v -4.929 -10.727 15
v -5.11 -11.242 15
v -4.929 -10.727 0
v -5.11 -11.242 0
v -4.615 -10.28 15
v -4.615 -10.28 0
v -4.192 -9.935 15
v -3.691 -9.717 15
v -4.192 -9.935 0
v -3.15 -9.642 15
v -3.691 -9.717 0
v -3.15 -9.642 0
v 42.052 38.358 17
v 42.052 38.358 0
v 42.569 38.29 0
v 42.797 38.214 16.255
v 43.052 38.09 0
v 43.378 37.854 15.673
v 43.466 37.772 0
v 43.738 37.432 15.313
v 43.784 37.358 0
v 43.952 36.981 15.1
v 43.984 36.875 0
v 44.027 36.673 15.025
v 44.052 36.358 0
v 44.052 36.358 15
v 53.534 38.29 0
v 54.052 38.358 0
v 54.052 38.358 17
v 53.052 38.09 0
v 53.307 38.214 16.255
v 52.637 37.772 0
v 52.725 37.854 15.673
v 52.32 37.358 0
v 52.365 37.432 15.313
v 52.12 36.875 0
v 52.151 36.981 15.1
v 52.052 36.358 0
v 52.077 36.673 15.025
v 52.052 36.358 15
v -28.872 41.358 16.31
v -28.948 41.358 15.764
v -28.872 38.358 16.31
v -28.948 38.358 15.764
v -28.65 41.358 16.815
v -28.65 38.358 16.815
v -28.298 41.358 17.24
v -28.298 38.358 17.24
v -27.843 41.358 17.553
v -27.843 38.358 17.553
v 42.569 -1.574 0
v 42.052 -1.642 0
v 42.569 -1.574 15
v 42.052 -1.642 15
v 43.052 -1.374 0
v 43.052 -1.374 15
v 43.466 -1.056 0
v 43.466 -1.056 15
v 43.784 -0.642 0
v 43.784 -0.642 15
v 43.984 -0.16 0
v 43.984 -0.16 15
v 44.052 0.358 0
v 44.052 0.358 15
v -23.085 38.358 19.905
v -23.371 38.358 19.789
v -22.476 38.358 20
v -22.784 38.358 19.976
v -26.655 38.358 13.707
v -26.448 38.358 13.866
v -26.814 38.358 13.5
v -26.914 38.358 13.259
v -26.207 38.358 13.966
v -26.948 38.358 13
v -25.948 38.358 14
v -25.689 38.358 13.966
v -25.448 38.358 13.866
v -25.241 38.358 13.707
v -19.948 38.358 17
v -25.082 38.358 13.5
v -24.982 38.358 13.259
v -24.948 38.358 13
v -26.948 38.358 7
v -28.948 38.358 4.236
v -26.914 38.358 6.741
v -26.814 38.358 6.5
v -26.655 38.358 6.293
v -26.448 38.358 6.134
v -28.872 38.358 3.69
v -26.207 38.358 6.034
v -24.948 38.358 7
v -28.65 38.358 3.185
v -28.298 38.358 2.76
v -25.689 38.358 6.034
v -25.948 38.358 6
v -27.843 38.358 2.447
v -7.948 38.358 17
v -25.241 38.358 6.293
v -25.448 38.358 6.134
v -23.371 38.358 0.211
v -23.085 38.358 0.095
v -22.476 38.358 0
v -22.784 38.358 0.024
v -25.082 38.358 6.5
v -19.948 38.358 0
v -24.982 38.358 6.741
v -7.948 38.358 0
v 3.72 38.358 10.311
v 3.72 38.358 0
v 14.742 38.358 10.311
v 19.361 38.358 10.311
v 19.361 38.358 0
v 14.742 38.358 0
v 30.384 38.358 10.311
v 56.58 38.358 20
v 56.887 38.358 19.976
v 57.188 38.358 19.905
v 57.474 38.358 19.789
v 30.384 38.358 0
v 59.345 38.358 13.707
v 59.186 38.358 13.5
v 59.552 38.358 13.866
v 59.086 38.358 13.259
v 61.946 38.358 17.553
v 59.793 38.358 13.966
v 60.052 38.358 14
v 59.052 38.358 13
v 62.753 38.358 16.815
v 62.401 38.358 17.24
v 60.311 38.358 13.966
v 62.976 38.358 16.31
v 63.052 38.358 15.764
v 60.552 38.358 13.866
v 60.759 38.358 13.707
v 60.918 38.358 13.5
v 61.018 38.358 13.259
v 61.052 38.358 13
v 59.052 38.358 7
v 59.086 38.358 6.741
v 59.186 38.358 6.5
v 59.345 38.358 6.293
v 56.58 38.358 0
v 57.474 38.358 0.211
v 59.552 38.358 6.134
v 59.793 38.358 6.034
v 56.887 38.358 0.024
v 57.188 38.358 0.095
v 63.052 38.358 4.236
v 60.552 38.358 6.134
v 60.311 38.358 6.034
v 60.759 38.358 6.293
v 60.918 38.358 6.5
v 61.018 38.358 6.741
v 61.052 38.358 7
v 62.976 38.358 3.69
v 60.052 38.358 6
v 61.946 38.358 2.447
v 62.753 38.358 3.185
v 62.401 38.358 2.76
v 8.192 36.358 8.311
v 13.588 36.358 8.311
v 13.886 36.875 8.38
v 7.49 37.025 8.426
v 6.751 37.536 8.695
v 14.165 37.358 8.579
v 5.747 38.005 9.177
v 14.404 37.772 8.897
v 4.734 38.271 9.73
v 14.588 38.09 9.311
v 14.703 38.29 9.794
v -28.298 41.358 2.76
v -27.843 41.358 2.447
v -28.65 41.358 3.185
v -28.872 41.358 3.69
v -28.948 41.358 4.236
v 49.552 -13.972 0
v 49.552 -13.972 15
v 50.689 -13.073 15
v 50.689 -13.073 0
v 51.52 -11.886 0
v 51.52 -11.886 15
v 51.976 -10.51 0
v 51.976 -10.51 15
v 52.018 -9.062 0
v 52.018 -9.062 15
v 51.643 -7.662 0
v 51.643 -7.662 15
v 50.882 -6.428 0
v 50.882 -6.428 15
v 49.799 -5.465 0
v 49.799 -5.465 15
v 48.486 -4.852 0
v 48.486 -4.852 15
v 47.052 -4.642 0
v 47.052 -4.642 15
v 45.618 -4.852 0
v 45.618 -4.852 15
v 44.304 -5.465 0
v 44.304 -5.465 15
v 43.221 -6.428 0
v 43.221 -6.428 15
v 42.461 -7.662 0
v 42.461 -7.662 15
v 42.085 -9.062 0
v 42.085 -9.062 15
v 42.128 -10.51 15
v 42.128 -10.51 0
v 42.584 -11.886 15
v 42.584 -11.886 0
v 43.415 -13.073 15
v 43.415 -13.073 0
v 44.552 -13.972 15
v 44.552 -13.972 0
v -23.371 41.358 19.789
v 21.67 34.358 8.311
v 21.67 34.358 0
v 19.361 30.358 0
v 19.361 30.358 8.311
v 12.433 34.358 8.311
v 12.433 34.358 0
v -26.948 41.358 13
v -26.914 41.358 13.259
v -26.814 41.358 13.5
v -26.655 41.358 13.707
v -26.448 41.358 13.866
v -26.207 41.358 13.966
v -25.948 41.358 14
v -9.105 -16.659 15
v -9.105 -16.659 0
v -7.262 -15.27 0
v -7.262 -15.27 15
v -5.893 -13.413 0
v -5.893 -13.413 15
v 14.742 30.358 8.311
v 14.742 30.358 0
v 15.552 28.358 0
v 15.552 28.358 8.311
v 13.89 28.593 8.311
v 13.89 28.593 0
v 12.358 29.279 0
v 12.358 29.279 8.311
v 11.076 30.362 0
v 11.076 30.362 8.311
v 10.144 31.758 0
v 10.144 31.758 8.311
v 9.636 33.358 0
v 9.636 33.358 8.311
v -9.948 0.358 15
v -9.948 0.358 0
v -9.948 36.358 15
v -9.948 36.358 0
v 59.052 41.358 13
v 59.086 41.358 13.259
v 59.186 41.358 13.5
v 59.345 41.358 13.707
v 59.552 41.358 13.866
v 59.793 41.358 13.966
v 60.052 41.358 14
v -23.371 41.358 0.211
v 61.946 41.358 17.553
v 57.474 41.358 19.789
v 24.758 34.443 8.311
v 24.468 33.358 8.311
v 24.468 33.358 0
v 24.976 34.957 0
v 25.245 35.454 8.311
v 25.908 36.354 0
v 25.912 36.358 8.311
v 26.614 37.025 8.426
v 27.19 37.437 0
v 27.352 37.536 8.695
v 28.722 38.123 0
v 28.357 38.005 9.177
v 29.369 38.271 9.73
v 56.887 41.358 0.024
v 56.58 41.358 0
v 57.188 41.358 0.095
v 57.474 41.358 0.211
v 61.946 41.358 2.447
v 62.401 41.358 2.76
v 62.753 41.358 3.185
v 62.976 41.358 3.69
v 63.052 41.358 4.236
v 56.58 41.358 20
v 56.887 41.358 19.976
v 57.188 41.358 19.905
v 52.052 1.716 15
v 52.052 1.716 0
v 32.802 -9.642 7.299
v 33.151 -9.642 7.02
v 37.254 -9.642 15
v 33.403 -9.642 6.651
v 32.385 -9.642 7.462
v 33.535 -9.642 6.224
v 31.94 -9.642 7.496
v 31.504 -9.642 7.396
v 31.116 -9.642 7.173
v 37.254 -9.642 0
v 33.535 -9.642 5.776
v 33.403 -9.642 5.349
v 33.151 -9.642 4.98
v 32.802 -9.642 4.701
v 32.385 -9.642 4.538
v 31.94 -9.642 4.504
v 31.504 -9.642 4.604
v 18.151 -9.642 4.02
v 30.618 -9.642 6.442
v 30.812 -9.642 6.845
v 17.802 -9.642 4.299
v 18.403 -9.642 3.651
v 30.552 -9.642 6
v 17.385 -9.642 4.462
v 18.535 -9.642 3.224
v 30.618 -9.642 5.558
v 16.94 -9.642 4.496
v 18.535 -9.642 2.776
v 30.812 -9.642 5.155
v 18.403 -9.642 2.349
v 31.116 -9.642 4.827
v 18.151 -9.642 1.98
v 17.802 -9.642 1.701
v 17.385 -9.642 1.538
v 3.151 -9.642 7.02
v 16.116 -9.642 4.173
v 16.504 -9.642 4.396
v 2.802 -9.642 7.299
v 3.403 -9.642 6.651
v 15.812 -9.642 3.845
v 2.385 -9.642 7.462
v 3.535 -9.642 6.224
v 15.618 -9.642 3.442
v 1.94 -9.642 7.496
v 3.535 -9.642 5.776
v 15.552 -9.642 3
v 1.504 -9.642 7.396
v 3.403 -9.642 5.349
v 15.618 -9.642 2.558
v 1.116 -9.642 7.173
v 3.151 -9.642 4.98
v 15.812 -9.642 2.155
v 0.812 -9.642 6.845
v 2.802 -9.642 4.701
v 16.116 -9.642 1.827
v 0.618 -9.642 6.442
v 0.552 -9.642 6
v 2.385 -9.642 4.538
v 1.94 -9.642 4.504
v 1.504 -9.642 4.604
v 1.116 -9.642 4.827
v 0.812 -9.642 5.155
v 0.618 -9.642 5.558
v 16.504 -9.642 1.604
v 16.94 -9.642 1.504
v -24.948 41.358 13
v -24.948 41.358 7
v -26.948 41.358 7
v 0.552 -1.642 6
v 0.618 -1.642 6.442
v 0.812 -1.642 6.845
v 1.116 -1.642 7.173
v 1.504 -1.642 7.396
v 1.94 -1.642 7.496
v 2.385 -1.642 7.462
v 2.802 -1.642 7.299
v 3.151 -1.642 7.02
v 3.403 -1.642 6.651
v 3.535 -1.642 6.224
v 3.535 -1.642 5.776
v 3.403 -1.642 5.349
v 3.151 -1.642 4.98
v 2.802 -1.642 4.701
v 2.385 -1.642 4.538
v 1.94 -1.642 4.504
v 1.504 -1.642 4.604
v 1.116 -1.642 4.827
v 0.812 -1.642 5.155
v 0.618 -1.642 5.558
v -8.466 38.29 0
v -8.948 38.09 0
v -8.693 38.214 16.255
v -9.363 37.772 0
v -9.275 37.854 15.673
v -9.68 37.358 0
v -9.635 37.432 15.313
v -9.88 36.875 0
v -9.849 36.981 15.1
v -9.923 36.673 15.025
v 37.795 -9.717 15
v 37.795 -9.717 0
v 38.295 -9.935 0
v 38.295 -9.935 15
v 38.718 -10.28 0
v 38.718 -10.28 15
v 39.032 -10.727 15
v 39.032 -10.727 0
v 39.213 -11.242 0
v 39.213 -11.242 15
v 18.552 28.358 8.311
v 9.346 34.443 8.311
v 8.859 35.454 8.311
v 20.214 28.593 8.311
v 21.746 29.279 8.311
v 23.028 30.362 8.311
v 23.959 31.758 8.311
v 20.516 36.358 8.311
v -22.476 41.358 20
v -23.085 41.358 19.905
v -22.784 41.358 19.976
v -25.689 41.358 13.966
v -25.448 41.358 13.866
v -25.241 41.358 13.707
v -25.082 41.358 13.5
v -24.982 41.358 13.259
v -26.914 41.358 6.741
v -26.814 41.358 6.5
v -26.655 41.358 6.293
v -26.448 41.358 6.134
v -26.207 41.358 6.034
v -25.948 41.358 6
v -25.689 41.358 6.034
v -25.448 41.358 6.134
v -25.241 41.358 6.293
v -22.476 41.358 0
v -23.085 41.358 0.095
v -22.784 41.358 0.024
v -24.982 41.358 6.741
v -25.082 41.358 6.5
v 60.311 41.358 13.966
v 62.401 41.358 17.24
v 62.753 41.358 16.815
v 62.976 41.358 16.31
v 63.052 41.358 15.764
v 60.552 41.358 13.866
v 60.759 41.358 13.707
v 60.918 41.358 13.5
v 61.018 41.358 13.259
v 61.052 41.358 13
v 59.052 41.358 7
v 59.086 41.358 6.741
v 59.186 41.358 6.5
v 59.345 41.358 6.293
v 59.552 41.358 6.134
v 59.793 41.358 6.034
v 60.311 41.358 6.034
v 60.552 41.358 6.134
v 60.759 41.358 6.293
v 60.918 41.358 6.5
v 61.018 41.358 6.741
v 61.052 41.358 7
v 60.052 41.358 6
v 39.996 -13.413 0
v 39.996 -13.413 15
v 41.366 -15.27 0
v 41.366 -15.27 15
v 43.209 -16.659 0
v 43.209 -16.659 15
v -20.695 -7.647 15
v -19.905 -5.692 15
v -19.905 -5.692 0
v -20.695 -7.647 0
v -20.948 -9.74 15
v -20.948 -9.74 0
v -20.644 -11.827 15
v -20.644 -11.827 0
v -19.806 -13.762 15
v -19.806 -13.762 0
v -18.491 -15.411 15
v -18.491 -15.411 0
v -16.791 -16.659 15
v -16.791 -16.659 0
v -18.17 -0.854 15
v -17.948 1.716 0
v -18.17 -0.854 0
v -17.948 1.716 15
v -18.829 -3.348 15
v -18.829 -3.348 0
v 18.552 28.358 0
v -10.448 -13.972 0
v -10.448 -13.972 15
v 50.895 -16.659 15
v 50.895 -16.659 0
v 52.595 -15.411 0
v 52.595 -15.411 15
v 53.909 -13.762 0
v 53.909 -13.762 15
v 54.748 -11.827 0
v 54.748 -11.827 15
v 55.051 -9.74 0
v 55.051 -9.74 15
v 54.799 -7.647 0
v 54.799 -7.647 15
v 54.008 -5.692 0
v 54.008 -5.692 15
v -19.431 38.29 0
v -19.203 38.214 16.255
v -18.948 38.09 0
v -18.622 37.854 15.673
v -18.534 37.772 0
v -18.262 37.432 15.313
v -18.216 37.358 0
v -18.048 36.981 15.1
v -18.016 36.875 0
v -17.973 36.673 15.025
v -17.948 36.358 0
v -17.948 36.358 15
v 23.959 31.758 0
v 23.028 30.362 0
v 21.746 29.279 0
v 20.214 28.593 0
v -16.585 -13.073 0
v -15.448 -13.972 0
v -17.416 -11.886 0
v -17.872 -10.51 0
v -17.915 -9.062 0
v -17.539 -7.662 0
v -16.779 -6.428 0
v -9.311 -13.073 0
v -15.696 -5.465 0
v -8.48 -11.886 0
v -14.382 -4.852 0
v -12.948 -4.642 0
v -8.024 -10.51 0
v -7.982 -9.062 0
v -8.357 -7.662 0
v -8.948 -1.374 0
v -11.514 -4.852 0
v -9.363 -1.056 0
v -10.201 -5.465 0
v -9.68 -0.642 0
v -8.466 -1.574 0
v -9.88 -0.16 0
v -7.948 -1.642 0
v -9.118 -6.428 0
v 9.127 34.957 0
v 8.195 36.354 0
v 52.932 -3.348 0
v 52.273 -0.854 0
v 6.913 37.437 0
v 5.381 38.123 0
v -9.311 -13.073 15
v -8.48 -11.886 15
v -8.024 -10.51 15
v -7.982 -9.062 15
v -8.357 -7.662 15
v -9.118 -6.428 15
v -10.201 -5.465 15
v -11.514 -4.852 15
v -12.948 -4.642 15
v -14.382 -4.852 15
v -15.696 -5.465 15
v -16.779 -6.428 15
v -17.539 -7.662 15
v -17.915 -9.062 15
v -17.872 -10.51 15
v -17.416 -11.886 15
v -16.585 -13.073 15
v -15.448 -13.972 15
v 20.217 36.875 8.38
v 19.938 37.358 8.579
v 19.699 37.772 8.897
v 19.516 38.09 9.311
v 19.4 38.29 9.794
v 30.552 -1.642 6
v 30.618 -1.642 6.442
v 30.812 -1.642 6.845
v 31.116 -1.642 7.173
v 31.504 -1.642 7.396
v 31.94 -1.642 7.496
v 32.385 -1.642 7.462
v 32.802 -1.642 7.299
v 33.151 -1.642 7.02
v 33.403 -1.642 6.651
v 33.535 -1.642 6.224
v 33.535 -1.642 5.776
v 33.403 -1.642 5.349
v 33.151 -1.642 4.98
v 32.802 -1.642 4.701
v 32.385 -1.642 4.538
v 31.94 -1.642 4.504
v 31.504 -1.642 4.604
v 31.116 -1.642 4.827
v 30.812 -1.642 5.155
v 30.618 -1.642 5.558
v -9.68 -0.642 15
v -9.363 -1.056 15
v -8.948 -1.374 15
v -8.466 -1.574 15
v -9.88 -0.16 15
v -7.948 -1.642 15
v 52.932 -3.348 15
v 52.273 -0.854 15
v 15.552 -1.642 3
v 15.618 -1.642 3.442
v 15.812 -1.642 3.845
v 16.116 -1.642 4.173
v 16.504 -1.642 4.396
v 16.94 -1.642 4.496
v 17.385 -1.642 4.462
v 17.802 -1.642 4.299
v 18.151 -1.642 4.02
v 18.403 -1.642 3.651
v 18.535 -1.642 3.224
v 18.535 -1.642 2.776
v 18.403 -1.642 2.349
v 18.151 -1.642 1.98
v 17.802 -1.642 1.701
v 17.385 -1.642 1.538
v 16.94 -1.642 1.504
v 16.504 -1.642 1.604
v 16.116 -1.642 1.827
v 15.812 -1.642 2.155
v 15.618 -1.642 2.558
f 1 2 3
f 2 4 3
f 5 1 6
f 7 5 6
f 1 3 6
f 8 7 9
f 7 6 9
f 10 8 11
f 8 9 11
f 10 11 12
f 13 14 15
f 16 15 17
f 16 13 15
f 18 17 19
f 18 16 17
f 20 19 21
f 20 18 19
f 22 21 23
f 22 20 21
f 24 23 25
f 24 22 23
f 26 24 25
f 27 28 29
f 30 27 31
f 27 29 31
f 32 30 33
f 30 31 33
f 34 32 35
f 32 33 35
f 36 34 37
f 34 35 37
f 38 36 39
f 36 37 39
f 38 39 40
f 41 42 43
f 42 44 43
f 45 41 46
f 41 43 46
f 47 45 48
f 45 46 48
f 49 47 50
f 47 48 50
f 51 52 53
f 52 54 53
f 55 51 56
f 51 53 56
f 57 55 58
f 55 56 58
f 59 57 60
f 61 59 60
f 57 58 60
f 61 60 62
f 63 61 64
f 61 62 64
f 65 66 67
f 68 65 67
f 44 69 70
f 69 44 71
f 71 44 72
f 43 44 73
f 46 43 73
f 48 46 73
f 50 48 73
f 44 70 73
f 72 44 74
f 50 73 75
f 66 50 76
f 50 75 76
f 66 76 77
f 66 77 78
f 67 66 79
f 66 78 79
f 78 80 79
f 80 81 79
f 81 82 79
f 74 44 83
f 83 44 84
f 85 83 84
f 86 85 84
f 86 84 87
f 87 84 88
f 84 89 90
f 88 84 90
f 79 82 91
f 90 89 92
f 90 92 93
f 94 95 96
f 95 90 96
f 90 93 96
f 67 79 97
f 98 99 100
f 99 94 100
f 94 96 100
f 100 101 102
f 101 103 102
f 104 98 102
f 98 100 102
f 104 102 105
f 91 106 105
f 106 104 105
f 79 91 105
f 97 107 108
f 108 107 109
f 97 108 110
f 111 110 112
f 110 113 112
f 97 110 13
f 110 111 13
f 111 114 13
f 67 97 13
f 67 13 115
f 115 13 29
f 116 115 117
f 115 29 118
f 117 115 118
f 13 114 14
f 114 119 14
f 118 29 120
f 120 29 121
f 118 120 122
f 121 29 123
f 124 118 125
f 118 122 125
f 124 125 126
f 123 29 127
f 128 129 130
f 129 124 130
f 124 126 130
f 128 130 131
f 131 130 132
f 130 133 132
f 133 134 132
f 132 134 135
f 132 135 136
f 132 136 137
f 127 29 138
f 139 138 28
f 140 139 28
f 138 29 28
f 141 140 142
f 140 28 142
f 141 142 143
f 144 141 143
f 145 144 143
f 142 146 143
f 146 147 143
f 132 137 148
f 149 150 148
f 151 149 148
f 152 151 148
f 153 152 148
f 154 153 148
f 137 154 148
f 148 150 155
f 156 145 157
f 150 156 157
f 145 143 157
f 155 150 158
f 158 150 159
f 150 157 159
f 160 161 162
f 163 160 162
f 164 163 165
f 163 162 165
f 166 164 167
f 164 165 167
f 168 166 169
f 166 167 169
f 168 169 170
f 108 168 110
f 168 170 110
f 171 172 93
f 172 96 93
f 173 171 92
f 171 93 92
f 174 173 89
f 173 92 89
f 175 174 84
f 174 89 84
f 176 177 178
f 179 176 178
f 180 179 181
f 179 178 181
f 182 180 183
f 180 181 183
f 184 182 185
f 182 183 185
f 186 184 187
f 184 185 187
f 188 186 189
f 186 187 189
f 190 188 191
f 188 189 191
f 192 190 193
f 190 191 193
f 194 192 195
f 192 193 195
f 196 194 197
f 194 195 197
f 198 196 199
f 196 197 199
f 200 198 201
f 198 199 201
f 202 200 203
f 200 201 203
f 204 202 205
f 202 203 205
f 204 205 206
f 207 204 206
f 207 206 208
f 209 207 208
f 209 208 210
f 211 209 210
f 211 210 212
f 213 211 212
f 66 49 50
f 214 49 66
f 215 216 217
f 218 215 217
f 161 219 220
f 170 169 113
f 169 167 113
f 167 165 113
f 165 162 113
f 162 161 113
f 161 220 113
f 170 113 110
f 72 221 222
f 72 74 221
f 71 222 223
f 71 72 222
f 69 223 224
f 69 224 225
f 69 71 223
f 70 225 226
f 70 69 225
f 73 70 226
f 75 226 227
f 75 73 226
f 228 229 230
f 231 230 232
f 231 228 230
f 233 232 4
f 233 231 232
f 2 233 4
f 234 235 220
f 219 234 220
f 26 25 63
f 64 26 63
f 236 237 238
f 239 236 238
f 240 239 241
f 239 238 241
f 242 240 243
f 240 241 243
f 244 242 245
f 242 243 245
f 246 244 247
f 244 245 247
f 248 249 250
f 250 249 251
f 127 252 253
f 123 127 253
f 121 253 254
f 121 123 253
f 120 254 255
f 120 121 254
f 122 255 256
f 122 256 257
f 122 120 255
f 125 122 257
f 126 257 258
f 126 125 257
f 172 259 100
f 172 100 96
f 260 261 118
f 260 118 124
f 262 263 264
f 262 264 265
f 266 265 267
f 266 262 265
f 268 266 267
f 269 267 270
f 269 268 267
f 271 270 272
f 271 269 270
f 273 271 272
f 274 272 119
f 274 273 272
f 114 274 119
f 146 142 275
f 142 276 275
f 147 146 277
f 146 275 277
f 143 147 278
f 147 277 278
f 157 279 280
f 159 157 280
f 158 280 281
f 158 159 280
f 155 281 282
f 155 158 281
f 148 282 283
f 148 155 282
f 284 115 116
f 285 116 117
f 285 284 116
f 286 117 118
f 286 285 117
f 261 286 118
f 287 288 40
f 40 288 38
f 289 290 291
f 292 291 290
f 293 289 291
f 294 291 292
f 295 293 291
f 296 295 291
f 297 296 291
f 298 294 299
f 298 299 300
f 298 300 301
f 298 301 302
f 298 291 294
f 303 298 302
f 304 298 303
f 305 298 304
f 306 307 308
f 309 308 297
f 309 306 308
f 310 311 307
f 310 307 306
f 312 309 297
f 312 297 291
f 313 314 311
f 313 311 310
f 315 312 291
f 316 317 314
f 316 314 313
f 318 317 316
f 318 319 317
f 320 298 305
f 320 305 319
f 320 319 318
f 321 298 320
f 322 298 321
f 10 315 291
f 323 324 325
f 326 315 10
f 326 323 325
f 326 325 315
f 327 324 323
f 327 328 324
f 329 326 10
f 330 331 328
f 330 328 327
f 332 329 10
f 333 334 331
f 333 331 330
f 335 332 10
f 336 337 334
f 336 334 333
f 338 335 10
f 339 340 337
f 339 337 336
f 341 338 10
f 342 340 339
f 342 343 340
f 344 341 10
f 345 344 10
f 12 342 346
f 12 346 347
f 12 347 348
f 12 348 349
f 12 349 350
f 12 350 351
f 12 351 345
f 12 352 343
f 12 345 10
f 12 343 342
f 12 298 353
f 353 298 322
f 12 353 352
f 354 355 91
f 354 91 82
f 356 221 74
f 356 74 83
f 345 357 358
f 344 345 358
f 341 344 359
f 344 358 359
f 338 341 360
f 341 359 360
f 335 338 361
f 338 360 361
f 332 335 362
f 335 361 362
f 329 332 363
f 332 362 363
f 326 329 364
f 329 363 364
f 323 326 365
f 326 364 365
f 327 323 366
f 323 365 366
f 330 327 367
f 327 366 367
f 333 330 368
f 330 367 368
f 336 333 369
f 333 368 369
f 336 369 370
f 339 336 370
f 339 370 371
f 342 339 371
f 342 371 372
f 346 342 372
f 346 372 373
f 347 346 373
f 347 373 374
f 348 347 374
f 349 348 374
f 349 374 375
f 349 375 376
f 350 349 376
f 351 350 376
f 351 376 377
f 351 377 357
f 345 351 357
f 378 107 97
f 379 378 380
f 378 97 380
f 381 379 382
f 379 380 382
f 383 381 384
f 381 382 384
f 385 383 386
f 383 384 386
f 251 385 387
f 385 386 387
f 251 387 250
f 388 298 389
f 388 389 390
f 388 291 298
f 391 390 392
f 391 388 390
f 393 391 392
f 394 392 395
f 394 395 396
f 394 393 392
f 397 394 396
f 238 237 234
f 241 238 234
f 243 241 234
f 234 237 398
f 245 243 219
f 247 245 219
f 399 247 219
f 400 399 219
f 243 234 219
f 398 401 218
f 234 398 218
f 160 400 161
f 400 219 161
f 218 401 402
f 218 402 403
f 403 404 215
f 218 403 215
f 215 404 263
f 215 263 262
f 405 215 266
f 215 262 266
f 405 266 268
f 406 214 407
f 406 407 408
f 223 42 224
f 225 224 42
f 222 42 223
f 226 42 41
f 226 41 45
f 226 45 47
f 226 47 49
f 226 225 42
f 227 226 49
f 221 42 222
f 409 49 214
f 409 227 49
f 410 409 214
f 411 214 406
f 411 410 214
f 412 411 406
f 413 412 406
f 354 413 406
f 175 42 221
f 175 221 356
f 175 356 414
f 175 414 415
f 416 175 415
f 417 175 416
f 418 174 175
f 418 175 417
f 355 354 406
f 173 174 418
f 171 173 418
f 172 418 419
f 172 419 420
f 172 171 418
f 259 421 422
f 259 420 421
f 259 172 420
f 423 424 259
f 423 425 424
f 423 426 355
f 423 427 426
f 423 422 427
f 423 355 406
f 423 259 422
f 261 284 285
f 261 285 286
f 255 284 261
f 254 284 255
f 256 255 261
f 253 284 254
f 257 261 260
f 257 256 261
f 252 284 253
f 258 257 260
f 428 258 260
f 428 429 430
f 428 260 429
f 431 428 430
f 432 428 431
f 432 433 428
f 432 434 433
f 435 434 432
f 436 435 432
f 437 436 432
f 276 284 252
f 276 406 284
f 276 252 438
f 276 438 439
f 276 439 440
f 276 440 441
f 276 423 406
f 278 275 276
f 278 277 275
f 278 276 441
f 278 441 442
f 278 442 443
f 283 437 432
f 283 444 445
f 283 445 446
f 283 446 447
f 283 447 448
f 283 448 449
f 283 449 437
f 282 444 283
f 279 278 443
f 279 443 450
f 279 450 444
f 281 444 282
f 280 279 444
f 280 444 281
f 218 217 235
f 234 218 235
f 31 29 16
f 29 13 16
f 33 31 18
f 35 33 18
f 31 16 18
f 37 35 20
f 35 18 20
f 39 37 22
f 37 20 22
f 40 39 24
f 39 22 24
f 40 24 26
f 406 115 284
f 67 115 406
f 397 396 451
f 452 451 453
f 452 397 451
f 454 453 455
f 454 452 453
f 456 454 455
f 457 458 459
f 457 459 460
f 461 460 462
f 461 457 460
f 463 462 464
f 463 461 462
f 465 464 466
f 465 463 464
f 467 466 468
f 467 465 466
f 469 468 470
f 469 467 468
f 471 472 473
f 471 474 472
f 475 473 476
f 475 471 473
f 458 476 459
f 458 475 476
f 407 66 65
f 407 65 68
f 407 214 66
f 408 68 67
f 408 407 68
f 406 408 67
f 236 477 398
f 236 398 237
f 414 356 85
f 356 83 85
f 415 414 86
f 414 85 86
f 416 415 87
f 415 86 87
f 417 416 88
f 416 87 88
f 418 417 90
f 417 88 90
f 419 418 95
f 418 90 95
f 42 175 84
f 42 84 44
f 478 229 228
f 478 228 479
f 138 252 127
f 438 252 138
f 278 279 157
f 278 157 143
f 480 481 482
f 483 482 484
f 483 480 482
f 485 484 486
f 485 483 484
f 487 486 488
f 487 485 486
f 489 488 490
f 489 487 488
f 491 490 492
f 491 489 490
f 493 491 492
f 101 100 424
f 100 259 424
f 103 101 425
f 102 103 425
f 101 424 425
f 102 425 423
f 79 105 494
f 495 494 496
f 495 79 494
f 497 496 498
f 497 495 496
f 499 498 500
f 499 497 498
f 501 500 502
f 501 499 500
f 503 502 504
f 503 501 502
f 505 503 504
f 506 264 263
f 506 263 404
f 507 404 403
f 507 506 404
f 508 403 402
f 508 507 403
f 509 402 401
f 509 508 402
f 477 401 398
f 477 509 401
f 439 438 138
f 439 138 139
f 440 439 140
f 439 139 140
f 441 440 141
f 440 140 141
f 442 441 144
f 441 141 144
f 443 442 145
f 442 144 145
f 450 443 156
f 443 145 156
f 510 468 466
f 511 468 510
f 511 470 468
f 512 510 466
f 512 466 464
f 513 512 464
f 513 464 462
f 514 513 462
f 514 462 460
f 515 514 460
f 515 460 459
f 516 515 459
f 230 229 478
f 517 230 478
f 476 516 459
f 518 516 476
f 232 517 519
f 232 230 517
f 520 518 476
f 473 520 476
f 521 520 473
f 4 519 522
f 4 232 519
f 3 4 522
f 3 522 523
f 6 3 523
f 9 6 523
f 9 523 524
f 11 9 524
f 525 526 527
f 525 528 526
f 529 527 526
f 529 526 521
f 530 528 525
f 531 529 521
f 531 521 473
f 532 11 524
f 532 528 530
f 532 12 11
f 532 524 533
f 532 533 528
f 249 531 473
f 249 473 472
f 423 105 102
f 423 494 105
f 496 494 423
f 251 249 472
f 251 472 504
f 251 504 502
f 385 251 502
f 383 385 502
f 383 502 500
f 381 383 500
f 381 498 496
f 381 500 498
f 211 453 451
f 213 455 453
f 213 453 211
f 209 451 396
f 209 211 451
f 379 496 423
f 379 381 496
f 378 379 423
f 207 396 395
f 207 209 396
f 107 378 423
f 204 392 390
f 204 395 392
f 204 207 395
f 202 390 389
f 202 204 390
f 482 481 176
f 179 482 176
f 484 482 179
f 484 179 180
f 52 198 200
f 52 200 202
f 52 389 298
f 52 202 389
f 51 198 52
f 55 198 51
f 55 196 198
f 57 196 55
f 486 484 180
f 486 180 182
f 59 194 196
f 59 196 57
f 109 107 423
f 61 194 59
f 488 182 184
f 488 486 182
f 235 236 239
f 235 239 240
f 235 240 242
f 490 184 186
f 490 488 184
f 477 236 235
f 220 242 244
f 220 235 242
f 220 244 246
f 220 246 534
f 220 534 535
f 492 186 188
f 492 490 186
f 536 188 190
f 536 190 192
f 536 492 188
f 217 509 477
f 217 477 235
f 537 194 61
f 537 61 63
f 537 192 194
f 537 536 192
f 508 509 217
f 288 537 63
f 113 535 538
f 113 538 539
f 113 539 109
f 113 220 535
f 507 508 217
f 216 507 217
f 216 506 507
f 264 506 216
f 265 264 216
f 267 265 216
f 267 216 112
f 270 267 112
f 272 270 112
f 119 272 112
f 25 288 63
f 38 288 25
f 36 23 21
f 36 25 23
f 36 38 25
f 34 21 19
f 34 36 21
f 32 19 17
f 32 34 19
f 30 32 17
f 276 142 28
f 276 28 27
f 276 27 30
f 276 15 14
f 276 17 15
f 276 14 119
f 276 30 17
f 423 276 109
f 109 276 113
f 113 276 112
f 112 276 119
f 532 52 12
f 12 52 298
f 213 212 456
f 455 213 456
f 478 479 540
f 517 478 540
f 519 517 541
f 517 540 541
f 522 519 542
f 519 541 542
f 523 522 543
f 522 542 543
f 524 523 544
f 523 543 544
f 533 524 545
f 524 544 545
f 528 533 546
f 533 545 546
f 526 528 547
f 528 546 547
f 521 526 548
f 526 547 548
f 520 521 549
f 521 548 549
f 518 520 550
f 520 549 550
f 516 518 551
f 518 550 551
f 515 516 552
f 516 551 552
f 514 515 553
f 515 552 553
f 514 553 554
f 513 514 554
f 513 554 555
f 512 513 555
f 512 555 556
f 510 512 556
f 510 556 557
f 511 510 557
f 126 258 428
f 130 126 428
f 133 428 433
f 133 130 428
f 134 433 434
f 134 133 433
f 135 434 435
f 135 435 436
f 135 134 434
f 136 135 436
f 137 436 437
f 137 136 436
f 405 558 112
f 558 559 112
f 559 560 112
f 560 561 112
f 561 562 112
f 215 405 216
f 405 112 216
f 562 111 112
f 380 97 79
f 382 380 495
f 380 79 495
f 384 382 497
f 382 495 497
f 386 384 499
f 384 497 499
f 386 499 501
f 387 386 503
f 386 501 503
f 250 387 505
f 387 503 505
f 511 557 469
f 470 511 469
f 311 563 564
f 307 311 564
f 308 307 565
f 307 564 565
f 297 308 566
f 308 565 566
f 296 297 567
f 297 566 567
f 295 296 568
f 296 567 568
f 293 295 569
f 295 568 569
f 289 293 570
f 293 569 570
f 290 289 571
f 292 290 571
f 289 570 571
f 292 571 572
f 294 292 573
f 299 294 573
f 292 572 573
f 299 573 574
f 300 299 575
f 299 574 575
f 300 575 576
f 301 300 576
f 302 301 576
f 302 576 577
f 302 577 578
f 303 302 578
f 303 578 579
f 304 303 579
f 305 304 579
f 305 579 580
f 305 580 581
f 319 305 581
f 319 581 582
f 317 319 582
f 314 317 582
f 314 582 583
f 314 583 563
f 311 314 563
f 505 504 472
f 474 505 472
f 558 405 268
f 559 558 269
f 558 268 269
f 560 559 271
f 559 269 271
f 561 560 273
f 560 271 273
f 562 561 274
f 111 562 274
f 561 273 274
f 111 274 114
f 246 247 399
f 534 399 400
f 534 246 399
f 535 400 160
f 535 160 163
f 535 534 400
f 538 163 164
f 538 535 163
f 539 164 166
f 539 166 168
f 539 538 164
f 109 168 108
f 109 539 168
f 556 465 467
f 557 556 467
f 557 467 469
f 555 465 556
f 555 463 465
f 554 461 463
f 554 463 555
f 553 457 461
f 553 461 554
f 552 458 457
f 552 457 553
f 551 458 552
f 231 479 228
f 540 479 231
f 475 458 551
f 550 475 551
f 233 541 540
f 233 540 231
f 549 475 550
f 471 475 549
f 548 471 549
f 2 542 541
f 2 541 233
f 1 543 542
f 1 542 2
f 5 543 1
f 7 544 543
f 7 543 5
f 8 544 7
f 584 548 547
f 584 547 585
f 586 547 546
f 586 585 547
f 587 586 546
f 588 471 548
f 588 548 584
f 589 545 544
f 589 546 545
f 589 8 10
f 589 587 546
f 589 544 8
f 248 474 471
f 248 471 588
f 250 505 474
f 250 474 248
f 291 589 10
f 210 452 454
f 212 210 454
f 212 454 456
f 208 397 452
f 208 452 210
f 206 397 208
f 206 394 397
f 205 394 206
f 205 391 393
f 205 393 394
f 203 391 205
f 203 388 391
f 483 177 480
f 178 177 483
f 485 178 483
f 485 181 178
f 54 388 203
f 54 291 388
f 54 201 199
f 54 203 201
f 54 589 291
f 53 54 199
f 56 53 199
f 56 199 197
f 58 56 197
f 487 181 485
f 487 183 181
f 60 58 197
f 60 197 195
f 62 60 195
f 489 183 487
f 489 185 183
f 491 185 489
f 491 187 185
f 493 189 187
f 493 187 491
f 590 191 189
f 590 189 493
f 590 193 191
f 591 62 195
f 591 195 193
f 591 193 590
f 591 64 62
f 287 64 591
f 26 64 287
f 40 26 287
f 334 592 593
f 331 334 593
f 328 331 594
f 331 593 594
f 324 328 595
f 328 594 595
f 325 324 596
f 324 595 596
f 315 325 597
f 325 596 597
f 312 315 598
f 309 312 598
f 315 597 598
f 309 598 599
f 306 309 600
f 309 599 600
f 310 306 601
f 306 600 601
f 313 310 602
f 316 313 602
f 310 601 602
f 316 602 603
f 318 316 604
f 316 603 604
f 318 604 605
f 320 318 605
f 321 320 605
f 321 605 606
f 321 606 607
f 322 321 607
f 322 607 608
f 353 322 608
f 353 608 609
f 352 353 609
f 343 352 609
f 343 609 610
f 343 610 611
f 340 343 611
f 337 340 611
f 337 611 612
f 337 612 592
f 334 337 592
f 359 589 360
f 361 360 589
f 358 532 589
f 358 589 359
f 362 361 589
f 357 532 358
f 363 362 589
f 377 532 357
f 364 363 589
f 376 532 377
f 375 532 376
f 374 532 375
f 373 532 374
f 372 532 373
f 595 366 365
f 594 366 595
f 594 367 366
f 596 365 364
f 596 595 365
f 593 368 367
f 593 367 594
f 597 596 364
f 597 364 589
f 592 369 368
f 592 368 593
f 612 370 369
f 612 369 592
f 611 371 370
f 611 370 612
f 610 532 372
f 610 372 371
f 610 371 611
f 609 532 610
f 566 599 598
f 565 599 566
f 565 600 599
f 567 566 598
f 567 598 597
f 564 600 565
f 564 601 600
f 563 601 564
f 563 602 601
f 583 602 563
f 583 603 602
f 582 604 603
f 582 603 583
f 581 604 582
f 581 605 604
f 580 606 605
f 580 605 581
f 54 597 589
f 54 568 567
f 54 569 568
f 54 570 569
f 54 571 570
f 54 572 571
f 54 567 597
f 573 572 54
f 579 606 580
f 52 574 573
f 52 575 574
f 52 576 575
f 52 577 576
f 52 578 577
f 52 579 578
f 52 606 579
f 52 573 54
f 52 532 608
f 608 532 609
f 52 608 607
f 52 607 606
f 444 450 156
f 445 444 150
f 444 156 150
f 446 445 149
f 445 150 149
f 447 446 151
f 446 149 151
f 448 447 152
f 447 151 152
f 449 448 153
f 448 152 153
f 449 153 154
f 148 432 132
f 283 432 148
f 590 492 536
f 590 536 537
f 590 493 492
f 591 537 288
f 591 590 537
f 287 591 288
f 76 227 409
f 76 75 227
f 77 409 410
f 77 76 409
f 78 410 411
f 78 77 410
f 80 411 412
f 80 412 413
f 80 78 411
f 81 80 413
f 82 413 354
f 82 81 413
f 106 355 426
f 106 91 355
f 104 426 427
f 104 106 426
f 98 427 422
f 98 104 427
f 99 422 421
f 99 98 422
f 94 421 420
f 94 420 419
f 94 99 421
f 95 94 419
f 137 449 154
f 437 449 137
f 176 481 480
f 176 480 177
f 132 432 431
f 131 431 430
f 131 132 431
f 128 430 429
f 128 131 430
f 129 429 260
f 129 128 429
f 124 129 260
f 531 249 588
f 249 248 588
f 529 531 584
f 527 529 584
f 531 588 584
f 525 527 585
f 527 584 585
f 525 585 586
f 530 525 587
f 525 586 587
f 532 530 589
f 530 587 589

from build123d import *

# Parameters (mm, degrees)
BOSS_EXTRUDE1_DEPTH = 15
SKETCH4_R           = 8.000000000000002
SKETCH4_R_2         = 7.999999999999998
BOSS_EXTRUDE2_DEPTH = 15
SKETCH5_R           = 5.000000000000004
SKETCH5_R_2         = 5.0000000000000036
CUT_EXTRUDE2_DEPTH  = 15
FILLET2_R           = 15
FILLET3_R           = 2
FILLET4_R           = 2
BOSS_EXTRUDE3_DEPTH = 3
CUT_EXTRUDE3_REACH  = 76.188
SKETCH10_R          = 1.5000000000000007
SKETCH10_R_2        = 1.500000000000004
BOSS_EXTRUDE4_DEPTH = 10.000000000000002
BOSS_EXTRUDE5_DEPTH = 3
CUT_EXTRUDE5_REACH  = 90.637
FILLET5_R           = 1
FILLET6_R           = 2
CUT_EXTRUDE6_REACH  = 80.013
FILLET7_R           = 6
FILLET8_R           = 6
FILLET9_R           = 2
CUT_EXTRUDE7_DEPTH  = 15
FILLET10_R          = 2


# Some blends are built 0.0001 mm under size
with BuildPart() as part:
    # Sketch1 → Boss-Extrude1 (new body)
    with BuildSketch(Plane.XY):
        Polygon((-17.948335406616224, 38.357764788911155), (-17.948335406616224, -1.642235211088847), (-9.948335406616222, -1.6422352110888458), (-9.948335406616222, 38.35776478891115), align=None)
        Polygon((52.051664593383784, -1.6422352110888379), (52.051664593383784, -9.642235211088838), (-17.948335406616224, -9.642235211088838), (-17.948335406616224, -1.642235211088847), align=None)
        Polygon((44.051664593383784, 38.35776478891116), (44.051664593383784, -1.6422352110888392), (52.05166459338378, -1.6422352110888379), (52.051664593383784, 38.35776478891116), align=None)
    extrude(amount=BOSS_EXTRUDE1_DEPTH)

    # Sketch4 → Boss-Extrude2 (add)
    with BuildSketch(Plane.XY.offset(15)):
        with Locations((-12.948335406616222, -9.642235211088838)):
            Circle(SKETCH4_R)
        with Locations((47.05166459338378, -9.64223521108884)):
            Circle(SKETCH4_R_2)
    extrude(amount=-BOSS_EXTRUDE2_DEPTH)

    # Sketch5 → Cut-Extrude2 (cut)
    with BuildSketch(Plane.XY.offset(15)):
        with Locations((-12.948335406616222, -9.642235211088838)):
            Circle(SKETCH5_R)
        with Locations((47.05166459338378, -9.642235211088837)):
            Circle(SKETCH5_R_2)
    extrude(amount=-CUT_EXTRUDE2_DEPTH, mode=Mode.SUBTRACT)

    # Fillet2
    fillet2_edges = [part.edges().sort_by_distance(p)[0] for p in [
        (-17.948335406616224, -3.397237212690439, 7.5),
        (52.051664593383784, -3.3972372126904498, 7.5),
    ]]
    fillet(fillet2_edges, radius=FILLET2_R)

    # Fillet3
    fillet3_edges = [part.edges().sort_by_distance(p)[0] for p in [
        (-4.94833540661622, -9.642235211088838, 7.5),
        (39.05166459338378, -9.642235211088838, 7.5),
    ]]
    fillet(fillet3_edges, radius=FILLET3_R)

    # Fillet4
    fillet4_edges = [part.edges().sort_by_distance(p)[0] for p in [
        (-9.948335406616222, -1.6422352110888463, 7.5),
        (44.051664593383784, -1.6422352110888392, 7.5),
    ]]
    fillet(fillet4_edges, radius=FILLET4_R)

    # Sketch6 → Boss-Extrude3 (add)
    with BuildSketch(Plane(origin=(3.327e-14, 38.35776478891114, 0), x_dir=(1, -4.3e-16, 0), z_dir=(4.3e-16, 1, 0))):
        Polygon((-22.948335406616234, 0), (57.05166459338378, 0), (57.05166459338378, -20), (-22.948335406616227, -20), align=None)
    extrude(amount=BOSS_EXTRUDE3_DEPTH)

    # Sketch10 → Cut-Extrude3 (cut, up to next)
    with BuildSketch(Plane(origin=(2.1e-16, -1.6422352110888447, 0), x_dir=(1, 1.3e-16, 0), z_dir=(-1.3e-16, 1, 0)), mode=Mode.PRIVATE) as cut_extrude3_sk1:
        with Locations(Location((2.0516645933837814, -6, 0), (0, 0, 180))):
            Circle(SKETCH10_R)
    cut_extrude3_tool1 = extrude(cut_extrude3_sk1.sketch, amount=-CUT_EXTRUDE3_REACH, mode=Mode.PRIVATE) & part.part
    # Sketch10 → Cut-Extrude3 (cut, up to next)
    with BuildSketch(Plane(origin=(2.1e-16, -1.6422352110888447, 0), x_dir=(1, 1.3e-16, 0), z_dir=(-1.3e-16, 1, 0)), mode=Mode.PRIVATE) as cut_extrude3_sk2:
        with Locations(Location((17.05166459338378, -3, 0), (0, 0, 180))):
            Circle(SKETCH10_R)
    cut_extrude3_tool2 = extrude(cut_extrude3_sk2.sketch, amount=-CUT_EXTRUDE3_REACH, mode=Mode.PRIVATE) & part.part
    # Sketch10 → Cut-Extrude3 (cut, up to next)
    with BuildSketch(Plane(origin=(2.1e-16, -1.6422352110888447, 0), x_dir=(1, 1.3e-16, 0), z_dir=(-1.3e-16, 1, 0)), mode=Mode.PRIVATE) as cut_extrude3_sk3:
        with Locations(Location((32.051664593383784, -6, 0), (0, 0, 180))):
            Circle(SKETCH10_R_2)
    cut_extrude3_tool3 = extrude(cut_extrude3_sk3.sketch, amount=-CUT_EXTRUDE3_REACH, mode=Mode.PRIVATE) & part.part
    add(cut_extrude3_tool1.solids().sort_by_distance((2.051665, -1.642235, 6))[0], mode=Mode.SUBTRACT)
    add(cut_extrude3_tool2.solids().sort_by_distance((17.051665, -1.642235, 3))[0], mode=Mode.SUBTRACT)
    add(cut_extrude3_tool3.solids().sort_by_distance((32.051665, -1.642235, 6))[0], mode=Mode.SUBTRACT)

    # Sketch11 → Boss-Extrude4 (add)
    with BuildSketch(Plane.XZ.offset(-38.35776478891114)):
        Polygon((24.55166459338377, 7.3e-16), (9.551664593383764, -2.02e-15), (9.551664593383764, 8.311370234309834), (24.551664593383766, 8.311370234309837), align=None)
    extrude(amount=BOSS_EXTRUDE4_DEPTH)

    # Sketch12 → Boss-Extrude5 (add)
    with BuildSketch(Plane(origin=(1.794e-14, 41.35776478891114, 0), x_dir=(1, -4.3e-16, 0), z_dir=(4.3e-16, 1, 0))):
        Polygon((-22.948335406616234, 0), (-28.94833540661623, -3), (-28.94833540661623, -17), (-22.948335406616227, -20), align=None)
        Polygon((57.05166459338377, -20.000000000000057), (63.05166459338377, -16.999999999999943), (63.05166459338377, -2.9999999999999574), (57.05166459338377, 0), align=None)
    extrude(amount=-BOSS_EXTRUDE5_DEPTH)

    # Sketch13 → Cut-Extrude5 (cut, up to next)
    with BuildSketch(Plane(origin=(1.794e-14, 41.35776478891114, 0), x_dir=(1, -4.3e-16, 0), z_dir=(4.3e-16, 1, 0)), mode=Mode.PRIVATE) as cut_extrude5_sk1:
        Polygon((59.05166459338377, -6), (61.05166459338377, -6), (61.05166459338378, -14), (59.05166459338377, -14), align=None)
    cut_extrude5_tool1 = extrude(cut_extrude5_sk1.sketch, amount=-CUT_EXTRUDE5_REACH, mode=Mode.PRIVATE) & part.part
    # Sketch13 → Cut-Extrude5 (cut, up to next)
    with BuildSketch(Plane(origin=(1.794e-14, 41.35776478891114, 0), x_dir=(1, -4.3e-16, 0), z_dir=(4.3e-16, 1, 0)), mode=Mode.PRIVATE) as cut_extrude5_sk2:
        Polygon((-26.948335406616234, -5.999999999999999), (-24.94833540661623, -6), (-24.94833540661623, -14.000000000000002), (-26.948335406616234, -14.000000000000002), align=None)
    cut_extrude5_tool2 = extrude(cut_extrude5_sk2.sketch, amount=-CUT_EXTRUDE5_REACH, mode=Mode.PRIVATE) & part.part
    add(cut_extrude5_tool1.solids().sort_by_distance((60.051665, 41.357765, 10))[0], mode=Mode.SUBTRACT)
    add(cut_extrude5_tool2.solids().sort_by_distance((-25.948335, 41.357765, 10))[0], mode=Mode.SUBTRACT)

    # Fillet5
    fillet5_edges = [part.edges().sort_by_distance(p)[0] for p in [
        (59.05166459338379, 39.85776478891111, 6),
        (61.05166459338379, 39.85776478891111, 6),
        (61.0516645933838, 39.85776478891111, 14),
        (59.05166459338379, 39.85776478891111, 14),
        (-26.948335406616216, 39.857764788911155, 14.000000000000002),
        (-24.948335406616213, 39.857764788911155, 14.000000000000002),
        (-24.948335406616213, 39.857764788911155, 6),
        (-26.948335406616216, 39.857764788911155, 5.999999999999999),
    ]]
    fillet(fillet5_edges, radius=FILLET5_R - 0.0001)  # a hair under: the kernel refuses the full size

    # Fillet6
    fillet6_edges = [part.edges().sort_by_distance(p)[0] for p in [
        (-22.948335406616202, 39.85776478891115, 0),
        (-22.948335406616195, 39.85776478891115, 20),
        (57.05166459338381, 39.85776478891112, 20),
        (57.05166459338381, 39.85776478891112, 0),
        (-28.948335406616213, 39.857764788911155, 17),
        (-28.948335406616213, 39.857764788911155, 3),
        (63.05166459338379, 39.85776478891111, 2.9999999999999574),
        (63.05166459338379, 39.85776478891111, 16.999999999999943),
    ]]
    fillet(fillet6_edges, radius=FILLET6_R)

    # Sketch14 → Cut-Extrude6 (cut, up to next)
    with BuildSketch(Plane(origin=(0, 0, 0), x_dir=(-1, 0, 0), z_dir=(0, 0, -1)), mode=Mode.PRIVATE) as cut_extrude6_sk1:
        Polygon((-42.051664593383784, -18.97236223001103), (-52.05166459338378, -18.97236223001103), (-49.55166459338378, -13.972362230011036), (-44.55166459338378, -13.972362230011036), align=None)
    cut_extrude6_tool1 = extrude(cut_extrude6_sk1.sketch, amount=-CUT_EXTRUDE6_REACH, mode=Mode.PRIVATE) & part.part
    # Sketch14 → Cut-Extrude6 (cut, up to next)
    with BuildSketch(Plane(origin=(0, 0, 0), x_dir=(-1, 0, 0), z_dir=(0, 0, -1)), mode=Mode.PRIVATE) as cut_extrude6_sk2:
        Polygon((17.948335406616224, -18.972362230011036), (7.948335406616221, -18.972362230011036), (10.448335406616224, -13.972362230011036), (15.448335406616224, -13.972362230011036), align=None)
    cut_extrude6_tool2 = extrude(cut_extrude6_sk2.sketch, amount=-CUT_EXTRUDE6_REACH, mode=Mode.PRIVATE) & part.part
    add(cut_extrude6_tool1.solids().sort_by_distance((47.051665, -16.75014, 0))[0], mode=Mode.SUBTRACT)
    add(cut_extrude6_tool2.solids().sort_by_distance((-12.948335, -16.75014, 0))[0], mode=Mode.SUBTRACT)

    # Fillet7
    fillet7_edges = [part.edges().sort_by_distance(p)[0] for p in [
        (24.55166459338378, 28.35776478891113, 4.155685117154919),
        (9.551664593383776, 28.357764788911137, 4.155685117154916),
    ]]
    fillet(fillet7_edges, radius=FILLET7_R)

    # Fillet8
    # the kernel refuses this fillet: 6 mm, written as the material it adds along each edge
    with BuildSketch(Plane(origin=(24.551664593383784, 38.35776478891113, 8.311370234309837), x_dir=(1, -1.22e-15, 4.3e-16), z_dir=(4.3e-16, 0, -1))) as fillet8_piece_1:
        with BuildLine():
            CenterArc((5.832159566204599, 6), FILLET8_R, 189.5940682268561, 80.40593177314383)
            Line((-0.08392021689509223, 5.000000000000448), (-0.675528195205062, 4.90000000000049))
            ThreePointArc((-0.675528195205062, 4.90000000000049), (-0.5999999999999965, 4.000000000000001), (-0.6000000000000014, 7.3e-16))
            Line((-0.6000000000000014, 7.3e-16), (-7.3e-16, -0.6000000000000014))
            Line((-7.3e-16, -0.6000000000000014), (5.832159566204594, -0.6000000000000014))
            Line((5.832159566204594, -0.6000000000000014), (5.832159566204595, 0))
        make_face()
    extrude(amount=8.311370234309837)
    with BuildSketch(Plane(origin=(9.55166459338378, 38.35776478891113, -2.02e-15), x_dir=(0.01678167981240219, -0.9998591776958763, 0), z_dir=(0, 0, 1))) as fillet8_piece_2:
        with BuildLine():
            CenterArc((5.901281631719588, -5.932028346925651), FILLET8_R, 98.63250366346277, 80.40593177319276)
            Line((-0.09787343445575636, -5.831338268056363), (-0.6977889410732921, -5.8212692601694345))
            Line((-0.6977889410732921, -5.8212692601694345), (-0.5999155066175272, 0.01006900788744134))
            Line((-0.5999155066175272, 0.01006900788744134), (0.01006900788744131, 0.5999155066175255))
            ThreePointArc((0.01006900788744131, 0.5999155066175255), (4.009505718670954, 0.5327887873679148), (4.9106464685856706, 0.5932028346925657))
            Line((4.9106464685856706, 0.5932028346925657), (5.000704210688756, 1e-17))
        make_face()
    extrude(amount=8.311370234309836)

    # Fillet9
    fillet9_edges = [part.edges().sort_by_distance(p)[0] for p in [
        (17.05166459338424, 38.35776478891257, 8.31137023431),
    ]]
    fillet(fillet9_edges, radius=FILLET9_R)

    # Sketch15 → Cut-Extrude7 (cut)
    with BuildSketch(Plane(origin=(0, 0, 0), x_dir=(-1, 0, 0), z_dir=(0, 0, -1))):
        Polygon((-12.43286243986677, 34.35776478891113), (-14.742263516625279, 38.35776478891114), (-19.36106567014228, 38.35776478891114), (-21.67046674690079, 34.35776478891113), (-19.36106567014228, 30.357764788911126), (-14.742263516625275, 30.357764788911126), align=None)
    extrude(amount=-CUT_EXTRUDE7_DEPTH, mode=Mode.SUBTRACT)

    # Fillet10
    fillet10_edges = [part.edges().sort_by_distance(p)[0] for p in [
        (-17.948335406616224, 38.357764788911155, 7.5),
        (-9.948335406616222, 38.35776478891115, 7.5),
        (44.051664593383784, 38.35776478891116, 7.5),
        (52.051664593383784, 38.35776478891116, 7.5),
        (48.051664593383784, 38.35776478891116, 15),
        (-13.948335406616224, 38.357764788911155, 15),
    ]]
    fillet(fillet10_edges, radius=FILLET10_R)


solid = part.part
